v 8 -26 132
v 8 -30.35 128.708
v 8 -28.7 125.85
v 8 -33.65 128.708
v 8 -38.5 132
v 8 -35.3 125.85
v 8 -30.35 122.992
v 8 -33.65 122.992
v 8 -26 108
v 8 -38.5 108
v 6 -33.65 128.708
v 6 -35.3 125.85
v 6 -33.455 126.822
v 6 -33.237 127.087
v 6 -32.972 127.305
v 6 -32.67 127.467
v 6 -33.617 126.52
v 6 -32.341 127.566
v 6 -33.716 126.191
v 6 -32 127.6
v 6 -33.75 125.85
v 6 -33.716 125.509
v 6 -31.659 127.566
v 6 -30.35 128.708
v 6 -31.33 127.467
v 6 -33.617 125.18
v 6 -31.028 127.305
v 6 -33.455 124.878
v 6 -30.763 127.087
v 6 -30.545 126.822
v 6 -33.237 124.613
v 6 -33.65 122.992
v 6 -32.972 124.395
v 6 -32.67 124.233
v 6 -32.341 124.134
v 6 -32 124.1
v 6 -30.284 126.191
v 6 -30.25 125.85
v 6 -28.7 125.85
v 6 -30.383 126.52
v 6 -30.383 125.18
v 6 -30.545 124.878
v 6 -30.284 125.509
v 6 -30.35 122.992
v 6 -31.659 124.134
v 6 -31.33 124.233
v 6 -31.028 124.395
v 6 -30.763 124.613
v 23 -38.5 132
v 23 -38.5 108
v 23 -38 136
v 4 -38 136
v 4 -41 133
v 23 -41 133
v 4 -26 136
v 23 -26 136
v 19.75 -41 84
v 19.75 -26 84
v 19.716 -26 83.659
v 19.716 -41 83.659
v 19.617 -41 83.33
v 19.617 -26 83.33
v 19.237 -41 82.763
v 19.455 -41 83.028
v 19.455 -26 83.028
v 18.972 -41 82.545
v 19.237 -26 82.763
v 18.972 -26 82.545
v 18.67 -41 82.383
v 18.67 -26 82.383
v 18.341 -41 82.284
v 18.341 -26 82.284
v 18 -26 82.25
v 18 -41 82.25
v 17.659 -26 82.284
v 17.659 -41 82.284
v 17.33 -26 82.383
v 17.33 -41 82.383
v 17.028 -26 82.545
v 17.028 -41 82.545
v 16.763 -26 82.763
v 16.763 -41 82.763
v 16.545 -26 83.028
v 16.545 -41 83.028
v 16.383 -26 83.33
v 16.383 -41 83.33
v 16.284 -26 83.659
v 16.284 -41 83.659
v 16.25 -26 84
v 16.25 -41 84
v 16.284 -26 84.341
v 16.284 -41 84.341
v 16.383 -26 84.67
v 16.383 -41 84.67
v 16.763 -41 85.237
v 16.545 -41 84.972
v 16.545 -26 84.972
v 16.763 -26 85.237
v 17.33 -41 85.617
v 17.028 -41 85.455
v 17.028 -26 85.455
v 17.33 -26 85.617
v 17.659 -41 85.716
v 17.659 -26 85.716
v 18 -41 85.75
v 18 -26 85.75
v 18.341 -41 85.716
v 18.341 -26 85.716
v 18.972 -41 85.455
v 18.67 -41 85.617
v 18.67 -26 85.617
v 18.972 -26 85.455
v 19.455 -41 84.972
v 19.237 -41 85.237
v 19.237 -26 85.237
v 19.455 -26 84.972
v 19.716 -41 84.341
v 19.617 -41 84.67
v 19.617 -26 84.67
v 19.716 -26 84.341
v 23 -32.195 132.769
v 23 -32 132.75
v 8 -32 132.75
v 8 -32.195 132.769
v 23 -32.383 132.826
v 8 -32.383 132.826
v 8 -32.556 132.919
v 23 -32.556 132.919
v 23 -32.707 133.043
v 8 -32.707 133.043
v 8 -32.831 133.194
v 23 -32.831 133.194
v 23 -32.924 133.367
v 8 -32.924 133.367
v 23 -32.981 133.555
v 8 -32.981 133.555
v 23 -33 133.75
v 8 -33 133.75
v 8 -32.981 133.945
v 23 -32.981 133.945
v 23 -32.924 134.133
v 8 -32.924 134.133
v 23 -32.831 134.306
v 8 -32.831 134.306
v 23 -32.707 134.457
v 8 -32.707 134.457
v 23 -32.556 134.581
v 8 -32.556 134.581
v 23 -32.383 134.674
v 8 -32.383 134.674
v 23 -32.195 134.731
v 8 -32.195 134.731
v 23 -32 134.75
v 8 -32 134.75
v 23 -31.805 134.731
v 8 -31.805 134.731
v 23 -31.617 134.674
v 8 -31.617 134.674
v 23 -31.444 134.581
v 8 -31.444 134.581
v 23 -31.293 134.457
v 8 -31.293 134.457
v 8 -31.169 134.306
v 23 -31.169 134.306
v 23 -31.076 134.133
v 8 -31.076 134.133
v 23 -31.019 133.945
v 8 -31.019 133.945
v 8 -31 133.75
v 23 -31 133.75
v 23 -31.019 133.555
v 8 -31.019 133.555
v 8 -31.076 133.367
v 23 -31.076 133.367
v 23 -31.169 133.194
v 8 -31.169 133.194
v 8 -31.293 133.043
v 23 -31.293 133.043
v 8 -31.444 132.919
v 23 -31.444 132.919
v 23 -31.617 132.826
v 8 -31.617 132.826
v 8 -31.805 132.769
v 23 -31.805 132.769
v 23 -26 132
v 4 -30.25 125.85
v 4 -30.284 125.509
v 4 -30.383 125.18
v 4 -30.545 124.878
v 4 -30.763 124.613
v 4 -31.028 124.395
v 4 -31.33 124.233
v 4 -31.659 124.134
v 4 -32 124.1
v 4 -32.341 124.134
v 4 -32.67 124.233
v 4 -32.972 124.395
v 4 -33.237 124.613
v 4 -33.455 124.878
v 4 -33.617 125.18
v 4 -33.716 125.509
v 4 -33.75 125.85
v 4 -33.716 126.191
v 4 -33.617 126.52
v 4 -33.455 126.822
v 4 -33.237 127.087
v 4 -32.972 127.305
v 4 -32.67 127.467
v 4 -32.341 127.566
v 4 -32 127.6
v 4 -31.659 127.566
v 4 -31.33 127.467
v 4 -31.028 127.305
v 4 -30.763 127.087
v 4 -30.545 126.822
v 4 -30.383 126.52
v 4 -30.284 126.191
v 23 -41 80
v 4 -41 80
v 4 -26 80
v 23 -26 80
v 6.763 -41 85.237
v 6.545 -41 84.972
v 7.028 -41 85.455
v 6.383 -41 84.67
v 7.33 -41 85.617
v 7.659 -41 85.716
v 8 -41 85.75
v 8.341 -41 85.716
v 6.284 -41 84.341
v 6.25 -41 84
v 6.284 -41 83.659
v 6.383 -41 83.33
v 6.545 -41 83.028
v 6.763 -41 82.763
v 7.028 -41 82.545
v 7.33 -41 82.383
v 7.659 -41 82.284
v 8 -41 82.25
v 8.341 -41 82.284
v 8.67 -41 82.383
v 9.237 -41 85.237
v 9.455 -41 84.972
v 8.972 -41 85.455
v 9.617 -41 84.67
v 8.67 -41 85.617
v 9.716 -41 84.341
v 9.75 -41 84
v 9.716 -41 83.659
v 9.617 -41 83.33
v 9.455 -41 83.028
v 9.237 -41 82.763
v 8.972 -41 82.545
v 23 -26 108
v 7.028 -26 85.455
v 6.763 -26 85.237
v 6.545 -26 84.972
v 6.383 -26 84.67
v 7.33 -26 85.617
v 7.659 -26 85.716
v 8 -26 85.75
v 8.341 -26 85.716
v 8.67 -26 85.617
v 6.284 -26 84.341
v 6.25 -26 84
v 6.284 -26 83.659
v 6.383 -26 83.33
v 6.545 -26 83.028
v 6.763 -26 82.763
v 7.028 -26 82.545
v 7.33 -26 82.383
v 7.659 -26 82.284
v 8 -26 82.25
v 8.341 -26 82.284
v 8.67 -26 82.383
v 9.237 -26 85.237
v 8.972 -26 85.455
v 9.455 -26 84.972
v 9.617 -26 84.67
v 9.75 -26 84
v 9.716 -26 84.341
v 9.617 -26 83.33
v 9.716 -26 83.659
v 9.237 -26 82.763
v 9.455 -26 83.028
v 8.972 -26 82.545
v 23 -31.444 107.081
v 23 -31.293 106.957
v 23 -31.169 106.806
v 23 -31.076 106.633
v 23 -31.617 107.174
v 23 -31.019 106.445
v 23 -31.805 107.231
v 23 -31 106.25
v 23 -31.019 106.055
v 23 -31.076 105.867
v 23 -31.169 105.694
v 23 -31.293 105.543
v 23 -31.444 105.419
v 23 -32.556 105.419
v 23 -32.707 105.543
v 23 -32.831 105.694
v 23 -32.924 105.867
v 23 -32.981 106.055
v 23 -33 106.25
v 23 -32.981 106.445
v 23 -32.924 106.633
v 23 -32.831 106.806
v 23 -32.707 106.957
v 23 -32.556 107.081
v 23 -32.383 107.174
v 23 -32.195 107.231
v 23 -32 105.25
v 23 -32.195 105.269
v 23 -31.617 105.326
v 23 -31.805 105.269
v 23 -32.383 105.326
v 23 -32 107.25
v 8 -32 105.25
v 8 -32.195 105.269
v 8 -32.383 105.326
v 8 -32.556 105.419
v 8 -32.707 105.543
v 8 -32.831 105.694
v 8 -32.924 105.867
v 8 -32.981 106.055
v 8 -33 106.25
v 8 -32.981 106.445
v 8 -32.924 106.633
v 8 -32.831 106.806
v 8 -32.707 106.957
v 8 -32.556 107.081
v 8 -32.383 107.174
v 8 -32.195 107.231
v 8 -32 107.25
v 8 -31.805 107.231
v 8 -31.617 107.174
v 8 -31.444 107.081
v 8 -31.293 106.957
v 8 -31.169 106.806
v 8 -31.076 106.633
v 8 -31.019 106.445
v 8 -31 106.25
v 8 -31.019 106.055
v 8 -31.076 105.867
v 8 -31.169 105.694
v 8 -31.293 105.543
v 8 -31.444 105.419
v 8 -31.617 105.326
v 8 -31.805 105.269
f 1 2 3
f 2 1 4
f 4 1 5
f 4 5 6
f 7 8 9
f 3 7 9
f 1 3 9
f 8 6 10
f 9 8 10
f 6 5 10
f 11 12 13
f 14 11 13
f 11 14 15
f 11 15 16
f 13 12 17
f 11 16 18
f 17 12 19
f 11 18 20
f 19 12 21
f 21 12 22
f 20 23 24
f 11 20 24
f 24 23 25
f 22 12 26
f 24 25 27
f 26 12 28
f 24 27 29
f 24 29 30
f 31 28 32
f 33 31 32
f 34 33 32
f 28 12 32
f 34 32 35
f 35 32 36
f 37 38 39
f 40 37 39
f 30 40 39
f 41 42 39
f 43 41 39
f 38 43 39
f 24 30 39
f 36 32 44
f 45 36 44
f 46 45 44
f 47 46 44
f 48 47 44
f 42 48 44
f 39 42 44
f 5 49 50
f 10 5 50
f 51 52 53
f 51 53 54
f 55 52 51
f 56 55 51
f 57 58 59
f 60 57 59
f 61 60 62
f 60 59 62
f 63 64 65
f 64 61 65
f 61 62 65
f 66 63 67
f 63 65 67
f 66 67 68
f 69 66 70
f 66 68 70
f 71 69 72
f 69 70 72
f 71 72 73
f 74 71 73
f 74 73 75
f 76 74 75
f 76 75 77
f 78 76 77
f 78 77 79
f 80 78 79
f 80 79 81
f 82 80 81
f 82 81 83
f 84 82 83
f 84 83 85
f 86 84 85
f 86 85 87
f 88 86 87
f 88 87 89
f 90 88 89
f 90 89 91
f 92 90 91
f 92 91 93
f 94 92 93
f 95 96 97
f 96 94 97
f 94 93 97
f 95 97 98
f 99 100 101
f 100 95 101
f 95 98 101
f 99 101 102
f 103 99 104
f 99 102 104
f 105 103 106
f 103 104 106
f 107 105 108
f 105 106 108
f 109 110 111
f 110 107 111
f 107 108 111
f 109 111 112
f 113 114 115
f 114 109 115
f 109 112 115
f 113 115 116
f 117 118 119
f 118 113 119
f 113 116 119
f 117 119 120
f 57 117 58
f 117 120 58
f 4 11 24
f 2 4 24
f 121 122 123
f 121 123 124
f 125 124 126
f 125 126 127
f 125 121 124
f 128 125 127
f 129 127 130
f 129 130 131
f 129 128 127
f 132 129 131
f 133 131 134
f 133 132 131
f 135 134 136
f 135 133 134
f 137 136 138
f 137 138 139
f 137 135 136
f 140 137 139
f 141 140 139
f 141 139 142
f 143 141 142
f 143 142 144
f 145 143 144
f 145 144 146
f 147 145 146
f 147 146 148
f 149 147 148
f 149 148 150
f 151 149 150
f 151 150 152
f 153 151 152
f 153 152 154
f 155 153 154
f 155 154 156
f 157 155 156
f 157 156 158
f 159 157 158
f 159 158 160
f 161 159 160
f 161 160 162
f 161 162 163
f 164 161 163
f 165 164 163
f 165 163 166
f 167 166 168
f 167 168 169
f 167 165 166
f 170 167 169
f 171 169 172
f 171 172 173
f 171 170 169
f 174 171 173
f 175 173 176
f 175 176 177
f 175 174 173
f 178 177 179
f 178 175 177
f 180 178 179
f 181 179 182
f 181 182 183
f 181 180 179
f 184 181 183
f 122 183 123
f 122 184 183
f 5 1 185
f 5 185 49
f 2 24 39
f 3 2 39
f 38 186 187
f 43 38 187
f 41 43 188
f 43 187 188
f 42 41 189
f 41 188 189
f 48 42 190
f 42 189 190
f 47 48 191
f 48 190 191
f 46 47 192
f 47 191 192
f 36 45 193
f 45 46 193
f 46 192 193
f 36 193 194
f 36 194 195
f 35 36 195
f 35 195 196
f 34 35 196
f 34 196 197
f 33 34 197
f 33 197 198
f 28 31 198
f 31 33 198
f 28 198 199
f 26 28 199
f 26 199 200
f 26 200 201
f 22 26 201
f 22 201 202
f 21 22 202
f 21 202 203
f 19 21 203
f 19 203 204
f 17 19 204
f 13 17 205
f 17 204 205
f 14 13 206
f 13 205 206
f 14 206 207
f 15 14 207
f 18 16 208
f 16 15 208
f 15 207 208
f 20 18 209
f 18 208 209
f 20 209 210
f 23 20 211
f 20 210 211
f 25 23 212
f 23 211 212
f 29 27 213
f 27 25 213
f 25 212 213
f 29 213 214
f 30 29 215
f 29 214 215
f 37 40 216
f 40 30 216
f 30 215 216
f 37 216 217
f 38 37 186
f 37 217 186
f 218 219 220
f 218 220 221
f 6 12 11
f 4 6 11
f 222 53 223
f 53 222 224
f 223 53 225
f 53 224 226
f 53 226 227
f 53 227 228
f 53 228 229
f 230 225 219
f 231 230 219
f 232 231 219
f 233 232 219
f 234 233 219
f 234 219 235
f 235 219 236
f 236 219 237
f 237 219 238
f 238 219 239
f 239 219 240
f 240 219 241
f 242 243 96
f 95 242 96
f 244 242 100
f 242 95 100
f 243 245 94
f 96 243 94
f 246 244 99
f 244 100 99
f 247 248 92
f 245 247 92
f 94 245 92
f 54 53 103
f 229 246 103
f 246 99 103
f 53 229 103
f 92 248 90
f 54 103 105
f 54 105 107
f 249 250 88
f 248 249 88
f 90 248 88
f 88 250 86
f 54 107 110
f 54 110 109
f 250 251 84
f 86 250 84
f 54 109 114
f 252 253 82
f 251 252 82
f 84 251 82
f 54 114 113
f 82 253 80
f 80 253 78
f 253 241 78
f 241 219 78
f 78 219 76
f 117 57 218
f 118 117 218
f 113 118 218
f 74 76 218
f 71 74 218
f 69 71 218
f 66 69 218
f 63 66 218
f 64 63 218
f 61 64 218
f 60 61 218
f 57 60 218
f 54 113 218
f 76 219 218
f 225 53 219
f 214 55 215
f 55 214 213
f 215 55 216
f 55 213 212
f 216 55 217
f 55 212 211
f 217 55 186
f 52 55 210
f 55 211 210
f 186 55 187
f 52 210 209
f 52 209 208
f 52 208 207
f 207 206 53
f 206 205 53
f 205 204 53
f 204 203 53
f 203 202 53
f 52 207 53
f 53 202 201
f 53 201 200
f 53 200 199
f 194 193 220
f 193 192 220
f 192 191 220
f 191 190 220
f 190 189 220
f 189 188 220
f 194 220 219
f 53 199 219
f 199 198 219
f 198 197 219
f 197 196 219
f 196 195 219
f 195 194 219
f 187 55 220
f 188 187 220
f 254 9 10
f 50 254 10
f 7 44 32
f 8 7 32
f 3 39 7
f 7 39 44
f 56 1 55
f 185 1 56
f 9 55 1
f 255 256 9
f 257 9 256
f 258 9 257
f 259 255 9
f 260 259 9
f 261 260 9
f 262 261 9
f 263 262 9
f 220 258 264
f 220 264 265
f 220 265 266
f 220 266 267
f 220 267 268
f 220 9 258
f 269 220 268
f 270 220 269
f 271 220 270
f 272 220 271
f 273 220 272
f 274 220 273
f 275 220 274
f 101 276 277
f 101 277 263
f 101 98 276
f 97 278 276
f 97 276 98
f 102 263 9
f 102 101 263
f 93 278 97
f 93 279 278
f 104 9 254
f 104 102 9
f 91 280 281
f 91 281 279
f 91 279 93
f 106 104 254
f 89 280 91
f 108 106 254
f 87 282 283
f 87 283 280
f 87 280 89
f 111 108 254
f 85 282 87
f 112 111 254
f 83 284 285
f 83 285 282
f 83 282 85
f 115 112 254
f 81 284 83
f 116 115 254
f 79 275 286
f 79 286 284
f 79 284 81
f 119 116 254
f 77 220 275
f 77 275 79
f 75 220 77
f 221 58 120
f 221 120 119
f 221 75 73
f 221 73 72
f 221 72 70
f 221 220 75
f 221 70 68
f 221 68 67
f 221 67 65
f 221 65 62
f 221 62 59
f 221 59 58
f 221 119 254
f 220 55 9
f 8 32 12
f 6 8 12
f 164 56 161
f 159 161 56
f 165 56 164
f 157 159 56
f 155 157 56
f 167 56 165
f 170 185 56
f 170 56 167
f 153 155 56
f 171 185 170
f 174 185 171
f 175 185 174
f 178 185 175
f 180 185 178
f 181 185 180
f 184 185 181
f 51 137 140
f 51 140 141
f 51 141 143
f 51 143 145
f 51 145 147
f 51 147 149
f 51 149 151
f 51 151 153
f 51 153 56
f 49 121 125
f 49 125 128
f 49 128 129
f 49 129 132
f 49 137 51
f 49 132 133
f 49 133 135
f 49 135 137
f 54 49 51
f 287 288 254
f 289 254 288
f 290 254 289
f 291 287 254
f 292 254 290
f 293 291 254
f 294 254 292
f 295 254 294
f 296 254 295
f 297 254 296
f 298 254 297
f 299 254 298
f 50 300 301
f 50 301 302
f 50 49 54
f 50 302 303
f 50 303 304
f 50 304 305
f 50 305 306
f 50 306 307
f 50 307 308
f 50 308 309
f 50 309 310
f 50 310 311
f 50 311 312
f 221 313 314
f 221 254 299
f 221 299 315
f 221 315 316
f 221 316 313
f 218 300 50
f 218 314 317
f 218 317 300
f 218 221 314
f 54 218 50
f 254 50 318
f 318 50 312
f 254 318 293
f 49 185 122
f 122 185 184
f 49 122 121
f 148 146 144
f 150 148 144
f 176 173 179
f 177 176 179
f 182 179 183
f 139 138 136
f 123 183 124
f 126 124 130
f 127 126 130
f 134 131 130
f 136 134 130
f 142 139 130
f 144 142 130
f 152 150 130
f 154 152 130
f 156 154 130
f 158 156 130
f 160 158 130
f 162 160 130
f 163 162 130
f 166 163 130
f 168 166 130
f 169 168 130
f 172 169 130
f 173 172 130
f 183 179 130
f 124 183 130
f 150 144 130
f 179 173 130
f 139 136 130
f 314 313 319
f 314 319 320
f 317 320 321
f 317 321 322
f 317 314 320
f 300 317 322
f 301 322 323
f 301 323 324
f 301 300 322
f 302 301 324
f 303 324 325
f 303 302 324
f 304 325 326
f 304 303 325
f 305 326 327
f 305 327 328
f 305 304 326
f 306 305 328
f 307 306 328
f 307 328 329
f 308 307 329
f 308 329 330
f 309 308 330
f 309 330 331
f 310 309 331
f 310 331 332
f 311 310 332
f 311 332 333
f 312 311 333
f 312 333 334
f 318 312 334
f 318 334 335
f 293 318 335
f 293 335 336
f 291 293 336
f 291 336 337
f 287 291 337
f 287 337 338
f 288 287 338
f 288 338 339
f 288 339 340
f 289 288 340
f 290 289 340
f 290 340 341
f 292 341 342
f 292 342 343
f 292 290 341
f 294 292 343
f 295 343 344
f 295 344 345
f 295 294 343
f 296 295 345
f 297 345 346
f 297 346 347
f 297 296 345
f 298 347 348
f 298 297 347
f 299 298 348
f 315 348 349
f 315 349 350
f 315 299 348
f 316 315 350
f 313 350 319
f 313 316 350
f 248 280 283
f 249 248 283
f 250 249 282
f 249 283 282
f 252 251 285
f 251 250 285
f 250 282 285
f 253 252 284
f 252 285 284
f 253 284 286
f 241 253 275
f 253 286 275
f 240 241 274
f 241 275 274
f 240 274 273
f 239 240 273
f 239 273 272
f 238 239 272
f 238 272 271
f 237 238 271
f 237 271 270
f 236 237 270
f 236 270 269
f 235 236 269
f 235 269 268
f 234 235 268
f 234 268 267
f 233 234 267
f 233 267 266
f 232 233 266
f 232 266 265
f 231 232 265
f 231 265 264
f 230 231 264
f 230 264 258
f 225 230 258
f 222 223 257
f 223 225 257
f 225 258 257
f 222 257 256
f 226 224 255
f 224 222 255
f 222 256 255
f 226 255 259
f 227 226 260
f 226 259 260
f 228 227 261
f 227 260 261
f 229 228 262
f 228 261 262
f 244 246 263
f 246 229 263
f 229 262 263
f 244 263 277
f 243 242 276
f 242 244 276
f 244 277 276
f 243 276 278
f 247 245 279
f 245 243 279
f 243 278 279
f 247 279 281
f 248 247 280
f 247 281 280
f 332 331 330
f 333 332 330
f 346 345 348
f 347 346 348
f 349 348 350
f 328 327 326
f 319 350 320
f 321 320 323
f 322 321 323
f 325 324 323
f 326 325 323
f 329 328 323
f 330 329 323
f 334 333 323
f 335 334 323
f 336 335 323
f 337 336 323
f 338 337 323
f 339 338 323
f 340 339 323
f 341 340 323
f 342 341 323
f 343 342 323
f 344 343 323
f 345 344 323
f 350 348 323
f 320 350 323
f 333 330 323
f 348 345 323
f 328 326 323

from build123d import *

# Parameters (mm, degrees)
CYLINDER075_R          = 1.75
CYLINDER075_DEPTH      = 32
PRISM001_DEPTH         = 10
SKETCH015_R            = 1
SKETCH015_W            = 24
SKETCH015_H            = 13
PAD010_DEPTH           = 30
CYLINDER073_R          = 1.75
CYLINDER073_DEPTH      = 32
CYLINDER073_ROLL_ANGLE = -90
CYLINDER074_R          = 1.75
CYLINDER074_DEPTH      = 32
CYLINDER074_ROLL_ANGLE = -90
BOX054_W               = 19
BOX054_H               = 15
BOX054_DEPTH           = 56
CHAMFER108_SIZE        = 3


with BuildPart() as cilindro016:
    # Cylinder075 → Cylinder075 (new body)
    with BuildSketch(Plane(origin=(-5, 104, 125.85), x_dir=(0, -1, 0), z_dir=(1, 0, 0))):
        Circle(CYLINDER075_R)
    extrude(amount=CYLINDER075_DEPTH)


with BuildPart() as fusion057:
    # Prism001 → Prism001 (new body)
    with BuildSketch(Plane(origin=(6, 104, 125.85), x_dir=(0, -1, 0), z_dir=(1, 0, 0))):
        Polygon((3.3, 0), (1.65, 2.857884), (-1.65, 2.857884), (-3.3, 0), (-1.65, -2.857884), (1.65, -2.857884), align=None)
    extrude(amount=PRISM001_DEPTH)

    # Fusion057: union Cilindro016
    add(cilindro016.part)


with BuildPart() as pad010:
    # Sketch015 → Pad010 (new body)
    with BuildSketch(Plane(origin=(38, -16, 143.25), x_dir=(0, 0, -1), z_dir=(1, 0, 0))):
        with Locations((37, 120)):
            Circle(SKETCH015_R)
        with Locations((9.5, 120)):
            Circle(SKETCH015_R)
        with Locations((23.25, 120)):
            Rectangle(SKETCH015_W, SKETCH015_H)
    extrude(amount=-PAD010_DEPTH)


with BuildPart() as cilindro014:
    # Cylinder073 → Cylinder073 (new body)
    with BuildSketch(Plane.XY):
        Circle(CYLINDER073_R)
    extrude(amount=CYLINDER073_DEPTH)


with BuildPart() as cilindro014_1:
    # Cylinder073 roll: moved
    add(cilindro014.part.rotate(Axis((0, 0, 0), (1, 0, 0)), CYLINDER073_ROLL_ANGLE))


with BuildPart() as cilindro014_2:
    # Cylinder073 placement: moved
    add(cilindro014_1.part.moved(Location((8, 90, 84))))


with BuildPart() as fusion056:
    # Cylinder074 → Cylinder074 (new body)
    with BuildSketch(Plane.XY):
        Circle(CYLINDER074_R)
    extrude(amount=CYLINDER074_DEPTH)


with BuildPart() as fusion056_1:
    # Cylinder074 roll: moved
    add(fusion056.part.rotate(Axis((0, 0, 0), (1, 0, 0)), CYLINDER074_ROLL_ANGLE))


with BuildPart() as fusion056_2:
    # Cylinder074 placement: moved
    add(fusion056_1.part.moved(Location((18, 90, 84))))

    # Fusion056: union Cilindro014
    add(cilindro014_2.part)


with BuildPart() as clone_of_cut100:
    # Box054 → Box054 (new body)
    with BuildSketch(Plane(origin=(4, 98, 80), x_dir=(1, 0, 0), z_dir=(0, 0, 1))):
        with Locations((9.5, 7.5)):
            Rectangle(BOX054_W, BOX054_H)
    extrude(amount=BOX054_DEPTH)

    # Cut098: cut Fusion056
    add(fusion056_2.part, mode=Mode.SUBTRACT)

    # Cut099: cut Pad010
    add(pad010.part, mode=Mode.SUBTRACT)

    # Chamfer108
    chamfer108_edges = [clone_of_cut100.edges().sort_by_distance(p)[0] for p in [
        (13.5, 113, 136),
    ]]
    chamfer(chamfer108_edges, length=CHAMFER108_SIZE)

    # Cut100: cut Fusion057
    add(fusion057.part, mode=Mode.SUBTRACT)


with BuildPart() as part_mirroring007009:
    # Part__Mirroring007009: instance of Clone of Cut100
    add(clone_of_cut100.part.mirror(Plane(origin=(0, 0, 0), x_dir=(1, 0, 0), z_dir=(0, 1, 0))))


with BuildPart() as part_mirroring007009_1:
    # Part__Mirroring007009 placement: moved
    add(part_mirroring007009.part.moved(Location((0, 72, 0))))


solid = part_mirroring007009_1.part
